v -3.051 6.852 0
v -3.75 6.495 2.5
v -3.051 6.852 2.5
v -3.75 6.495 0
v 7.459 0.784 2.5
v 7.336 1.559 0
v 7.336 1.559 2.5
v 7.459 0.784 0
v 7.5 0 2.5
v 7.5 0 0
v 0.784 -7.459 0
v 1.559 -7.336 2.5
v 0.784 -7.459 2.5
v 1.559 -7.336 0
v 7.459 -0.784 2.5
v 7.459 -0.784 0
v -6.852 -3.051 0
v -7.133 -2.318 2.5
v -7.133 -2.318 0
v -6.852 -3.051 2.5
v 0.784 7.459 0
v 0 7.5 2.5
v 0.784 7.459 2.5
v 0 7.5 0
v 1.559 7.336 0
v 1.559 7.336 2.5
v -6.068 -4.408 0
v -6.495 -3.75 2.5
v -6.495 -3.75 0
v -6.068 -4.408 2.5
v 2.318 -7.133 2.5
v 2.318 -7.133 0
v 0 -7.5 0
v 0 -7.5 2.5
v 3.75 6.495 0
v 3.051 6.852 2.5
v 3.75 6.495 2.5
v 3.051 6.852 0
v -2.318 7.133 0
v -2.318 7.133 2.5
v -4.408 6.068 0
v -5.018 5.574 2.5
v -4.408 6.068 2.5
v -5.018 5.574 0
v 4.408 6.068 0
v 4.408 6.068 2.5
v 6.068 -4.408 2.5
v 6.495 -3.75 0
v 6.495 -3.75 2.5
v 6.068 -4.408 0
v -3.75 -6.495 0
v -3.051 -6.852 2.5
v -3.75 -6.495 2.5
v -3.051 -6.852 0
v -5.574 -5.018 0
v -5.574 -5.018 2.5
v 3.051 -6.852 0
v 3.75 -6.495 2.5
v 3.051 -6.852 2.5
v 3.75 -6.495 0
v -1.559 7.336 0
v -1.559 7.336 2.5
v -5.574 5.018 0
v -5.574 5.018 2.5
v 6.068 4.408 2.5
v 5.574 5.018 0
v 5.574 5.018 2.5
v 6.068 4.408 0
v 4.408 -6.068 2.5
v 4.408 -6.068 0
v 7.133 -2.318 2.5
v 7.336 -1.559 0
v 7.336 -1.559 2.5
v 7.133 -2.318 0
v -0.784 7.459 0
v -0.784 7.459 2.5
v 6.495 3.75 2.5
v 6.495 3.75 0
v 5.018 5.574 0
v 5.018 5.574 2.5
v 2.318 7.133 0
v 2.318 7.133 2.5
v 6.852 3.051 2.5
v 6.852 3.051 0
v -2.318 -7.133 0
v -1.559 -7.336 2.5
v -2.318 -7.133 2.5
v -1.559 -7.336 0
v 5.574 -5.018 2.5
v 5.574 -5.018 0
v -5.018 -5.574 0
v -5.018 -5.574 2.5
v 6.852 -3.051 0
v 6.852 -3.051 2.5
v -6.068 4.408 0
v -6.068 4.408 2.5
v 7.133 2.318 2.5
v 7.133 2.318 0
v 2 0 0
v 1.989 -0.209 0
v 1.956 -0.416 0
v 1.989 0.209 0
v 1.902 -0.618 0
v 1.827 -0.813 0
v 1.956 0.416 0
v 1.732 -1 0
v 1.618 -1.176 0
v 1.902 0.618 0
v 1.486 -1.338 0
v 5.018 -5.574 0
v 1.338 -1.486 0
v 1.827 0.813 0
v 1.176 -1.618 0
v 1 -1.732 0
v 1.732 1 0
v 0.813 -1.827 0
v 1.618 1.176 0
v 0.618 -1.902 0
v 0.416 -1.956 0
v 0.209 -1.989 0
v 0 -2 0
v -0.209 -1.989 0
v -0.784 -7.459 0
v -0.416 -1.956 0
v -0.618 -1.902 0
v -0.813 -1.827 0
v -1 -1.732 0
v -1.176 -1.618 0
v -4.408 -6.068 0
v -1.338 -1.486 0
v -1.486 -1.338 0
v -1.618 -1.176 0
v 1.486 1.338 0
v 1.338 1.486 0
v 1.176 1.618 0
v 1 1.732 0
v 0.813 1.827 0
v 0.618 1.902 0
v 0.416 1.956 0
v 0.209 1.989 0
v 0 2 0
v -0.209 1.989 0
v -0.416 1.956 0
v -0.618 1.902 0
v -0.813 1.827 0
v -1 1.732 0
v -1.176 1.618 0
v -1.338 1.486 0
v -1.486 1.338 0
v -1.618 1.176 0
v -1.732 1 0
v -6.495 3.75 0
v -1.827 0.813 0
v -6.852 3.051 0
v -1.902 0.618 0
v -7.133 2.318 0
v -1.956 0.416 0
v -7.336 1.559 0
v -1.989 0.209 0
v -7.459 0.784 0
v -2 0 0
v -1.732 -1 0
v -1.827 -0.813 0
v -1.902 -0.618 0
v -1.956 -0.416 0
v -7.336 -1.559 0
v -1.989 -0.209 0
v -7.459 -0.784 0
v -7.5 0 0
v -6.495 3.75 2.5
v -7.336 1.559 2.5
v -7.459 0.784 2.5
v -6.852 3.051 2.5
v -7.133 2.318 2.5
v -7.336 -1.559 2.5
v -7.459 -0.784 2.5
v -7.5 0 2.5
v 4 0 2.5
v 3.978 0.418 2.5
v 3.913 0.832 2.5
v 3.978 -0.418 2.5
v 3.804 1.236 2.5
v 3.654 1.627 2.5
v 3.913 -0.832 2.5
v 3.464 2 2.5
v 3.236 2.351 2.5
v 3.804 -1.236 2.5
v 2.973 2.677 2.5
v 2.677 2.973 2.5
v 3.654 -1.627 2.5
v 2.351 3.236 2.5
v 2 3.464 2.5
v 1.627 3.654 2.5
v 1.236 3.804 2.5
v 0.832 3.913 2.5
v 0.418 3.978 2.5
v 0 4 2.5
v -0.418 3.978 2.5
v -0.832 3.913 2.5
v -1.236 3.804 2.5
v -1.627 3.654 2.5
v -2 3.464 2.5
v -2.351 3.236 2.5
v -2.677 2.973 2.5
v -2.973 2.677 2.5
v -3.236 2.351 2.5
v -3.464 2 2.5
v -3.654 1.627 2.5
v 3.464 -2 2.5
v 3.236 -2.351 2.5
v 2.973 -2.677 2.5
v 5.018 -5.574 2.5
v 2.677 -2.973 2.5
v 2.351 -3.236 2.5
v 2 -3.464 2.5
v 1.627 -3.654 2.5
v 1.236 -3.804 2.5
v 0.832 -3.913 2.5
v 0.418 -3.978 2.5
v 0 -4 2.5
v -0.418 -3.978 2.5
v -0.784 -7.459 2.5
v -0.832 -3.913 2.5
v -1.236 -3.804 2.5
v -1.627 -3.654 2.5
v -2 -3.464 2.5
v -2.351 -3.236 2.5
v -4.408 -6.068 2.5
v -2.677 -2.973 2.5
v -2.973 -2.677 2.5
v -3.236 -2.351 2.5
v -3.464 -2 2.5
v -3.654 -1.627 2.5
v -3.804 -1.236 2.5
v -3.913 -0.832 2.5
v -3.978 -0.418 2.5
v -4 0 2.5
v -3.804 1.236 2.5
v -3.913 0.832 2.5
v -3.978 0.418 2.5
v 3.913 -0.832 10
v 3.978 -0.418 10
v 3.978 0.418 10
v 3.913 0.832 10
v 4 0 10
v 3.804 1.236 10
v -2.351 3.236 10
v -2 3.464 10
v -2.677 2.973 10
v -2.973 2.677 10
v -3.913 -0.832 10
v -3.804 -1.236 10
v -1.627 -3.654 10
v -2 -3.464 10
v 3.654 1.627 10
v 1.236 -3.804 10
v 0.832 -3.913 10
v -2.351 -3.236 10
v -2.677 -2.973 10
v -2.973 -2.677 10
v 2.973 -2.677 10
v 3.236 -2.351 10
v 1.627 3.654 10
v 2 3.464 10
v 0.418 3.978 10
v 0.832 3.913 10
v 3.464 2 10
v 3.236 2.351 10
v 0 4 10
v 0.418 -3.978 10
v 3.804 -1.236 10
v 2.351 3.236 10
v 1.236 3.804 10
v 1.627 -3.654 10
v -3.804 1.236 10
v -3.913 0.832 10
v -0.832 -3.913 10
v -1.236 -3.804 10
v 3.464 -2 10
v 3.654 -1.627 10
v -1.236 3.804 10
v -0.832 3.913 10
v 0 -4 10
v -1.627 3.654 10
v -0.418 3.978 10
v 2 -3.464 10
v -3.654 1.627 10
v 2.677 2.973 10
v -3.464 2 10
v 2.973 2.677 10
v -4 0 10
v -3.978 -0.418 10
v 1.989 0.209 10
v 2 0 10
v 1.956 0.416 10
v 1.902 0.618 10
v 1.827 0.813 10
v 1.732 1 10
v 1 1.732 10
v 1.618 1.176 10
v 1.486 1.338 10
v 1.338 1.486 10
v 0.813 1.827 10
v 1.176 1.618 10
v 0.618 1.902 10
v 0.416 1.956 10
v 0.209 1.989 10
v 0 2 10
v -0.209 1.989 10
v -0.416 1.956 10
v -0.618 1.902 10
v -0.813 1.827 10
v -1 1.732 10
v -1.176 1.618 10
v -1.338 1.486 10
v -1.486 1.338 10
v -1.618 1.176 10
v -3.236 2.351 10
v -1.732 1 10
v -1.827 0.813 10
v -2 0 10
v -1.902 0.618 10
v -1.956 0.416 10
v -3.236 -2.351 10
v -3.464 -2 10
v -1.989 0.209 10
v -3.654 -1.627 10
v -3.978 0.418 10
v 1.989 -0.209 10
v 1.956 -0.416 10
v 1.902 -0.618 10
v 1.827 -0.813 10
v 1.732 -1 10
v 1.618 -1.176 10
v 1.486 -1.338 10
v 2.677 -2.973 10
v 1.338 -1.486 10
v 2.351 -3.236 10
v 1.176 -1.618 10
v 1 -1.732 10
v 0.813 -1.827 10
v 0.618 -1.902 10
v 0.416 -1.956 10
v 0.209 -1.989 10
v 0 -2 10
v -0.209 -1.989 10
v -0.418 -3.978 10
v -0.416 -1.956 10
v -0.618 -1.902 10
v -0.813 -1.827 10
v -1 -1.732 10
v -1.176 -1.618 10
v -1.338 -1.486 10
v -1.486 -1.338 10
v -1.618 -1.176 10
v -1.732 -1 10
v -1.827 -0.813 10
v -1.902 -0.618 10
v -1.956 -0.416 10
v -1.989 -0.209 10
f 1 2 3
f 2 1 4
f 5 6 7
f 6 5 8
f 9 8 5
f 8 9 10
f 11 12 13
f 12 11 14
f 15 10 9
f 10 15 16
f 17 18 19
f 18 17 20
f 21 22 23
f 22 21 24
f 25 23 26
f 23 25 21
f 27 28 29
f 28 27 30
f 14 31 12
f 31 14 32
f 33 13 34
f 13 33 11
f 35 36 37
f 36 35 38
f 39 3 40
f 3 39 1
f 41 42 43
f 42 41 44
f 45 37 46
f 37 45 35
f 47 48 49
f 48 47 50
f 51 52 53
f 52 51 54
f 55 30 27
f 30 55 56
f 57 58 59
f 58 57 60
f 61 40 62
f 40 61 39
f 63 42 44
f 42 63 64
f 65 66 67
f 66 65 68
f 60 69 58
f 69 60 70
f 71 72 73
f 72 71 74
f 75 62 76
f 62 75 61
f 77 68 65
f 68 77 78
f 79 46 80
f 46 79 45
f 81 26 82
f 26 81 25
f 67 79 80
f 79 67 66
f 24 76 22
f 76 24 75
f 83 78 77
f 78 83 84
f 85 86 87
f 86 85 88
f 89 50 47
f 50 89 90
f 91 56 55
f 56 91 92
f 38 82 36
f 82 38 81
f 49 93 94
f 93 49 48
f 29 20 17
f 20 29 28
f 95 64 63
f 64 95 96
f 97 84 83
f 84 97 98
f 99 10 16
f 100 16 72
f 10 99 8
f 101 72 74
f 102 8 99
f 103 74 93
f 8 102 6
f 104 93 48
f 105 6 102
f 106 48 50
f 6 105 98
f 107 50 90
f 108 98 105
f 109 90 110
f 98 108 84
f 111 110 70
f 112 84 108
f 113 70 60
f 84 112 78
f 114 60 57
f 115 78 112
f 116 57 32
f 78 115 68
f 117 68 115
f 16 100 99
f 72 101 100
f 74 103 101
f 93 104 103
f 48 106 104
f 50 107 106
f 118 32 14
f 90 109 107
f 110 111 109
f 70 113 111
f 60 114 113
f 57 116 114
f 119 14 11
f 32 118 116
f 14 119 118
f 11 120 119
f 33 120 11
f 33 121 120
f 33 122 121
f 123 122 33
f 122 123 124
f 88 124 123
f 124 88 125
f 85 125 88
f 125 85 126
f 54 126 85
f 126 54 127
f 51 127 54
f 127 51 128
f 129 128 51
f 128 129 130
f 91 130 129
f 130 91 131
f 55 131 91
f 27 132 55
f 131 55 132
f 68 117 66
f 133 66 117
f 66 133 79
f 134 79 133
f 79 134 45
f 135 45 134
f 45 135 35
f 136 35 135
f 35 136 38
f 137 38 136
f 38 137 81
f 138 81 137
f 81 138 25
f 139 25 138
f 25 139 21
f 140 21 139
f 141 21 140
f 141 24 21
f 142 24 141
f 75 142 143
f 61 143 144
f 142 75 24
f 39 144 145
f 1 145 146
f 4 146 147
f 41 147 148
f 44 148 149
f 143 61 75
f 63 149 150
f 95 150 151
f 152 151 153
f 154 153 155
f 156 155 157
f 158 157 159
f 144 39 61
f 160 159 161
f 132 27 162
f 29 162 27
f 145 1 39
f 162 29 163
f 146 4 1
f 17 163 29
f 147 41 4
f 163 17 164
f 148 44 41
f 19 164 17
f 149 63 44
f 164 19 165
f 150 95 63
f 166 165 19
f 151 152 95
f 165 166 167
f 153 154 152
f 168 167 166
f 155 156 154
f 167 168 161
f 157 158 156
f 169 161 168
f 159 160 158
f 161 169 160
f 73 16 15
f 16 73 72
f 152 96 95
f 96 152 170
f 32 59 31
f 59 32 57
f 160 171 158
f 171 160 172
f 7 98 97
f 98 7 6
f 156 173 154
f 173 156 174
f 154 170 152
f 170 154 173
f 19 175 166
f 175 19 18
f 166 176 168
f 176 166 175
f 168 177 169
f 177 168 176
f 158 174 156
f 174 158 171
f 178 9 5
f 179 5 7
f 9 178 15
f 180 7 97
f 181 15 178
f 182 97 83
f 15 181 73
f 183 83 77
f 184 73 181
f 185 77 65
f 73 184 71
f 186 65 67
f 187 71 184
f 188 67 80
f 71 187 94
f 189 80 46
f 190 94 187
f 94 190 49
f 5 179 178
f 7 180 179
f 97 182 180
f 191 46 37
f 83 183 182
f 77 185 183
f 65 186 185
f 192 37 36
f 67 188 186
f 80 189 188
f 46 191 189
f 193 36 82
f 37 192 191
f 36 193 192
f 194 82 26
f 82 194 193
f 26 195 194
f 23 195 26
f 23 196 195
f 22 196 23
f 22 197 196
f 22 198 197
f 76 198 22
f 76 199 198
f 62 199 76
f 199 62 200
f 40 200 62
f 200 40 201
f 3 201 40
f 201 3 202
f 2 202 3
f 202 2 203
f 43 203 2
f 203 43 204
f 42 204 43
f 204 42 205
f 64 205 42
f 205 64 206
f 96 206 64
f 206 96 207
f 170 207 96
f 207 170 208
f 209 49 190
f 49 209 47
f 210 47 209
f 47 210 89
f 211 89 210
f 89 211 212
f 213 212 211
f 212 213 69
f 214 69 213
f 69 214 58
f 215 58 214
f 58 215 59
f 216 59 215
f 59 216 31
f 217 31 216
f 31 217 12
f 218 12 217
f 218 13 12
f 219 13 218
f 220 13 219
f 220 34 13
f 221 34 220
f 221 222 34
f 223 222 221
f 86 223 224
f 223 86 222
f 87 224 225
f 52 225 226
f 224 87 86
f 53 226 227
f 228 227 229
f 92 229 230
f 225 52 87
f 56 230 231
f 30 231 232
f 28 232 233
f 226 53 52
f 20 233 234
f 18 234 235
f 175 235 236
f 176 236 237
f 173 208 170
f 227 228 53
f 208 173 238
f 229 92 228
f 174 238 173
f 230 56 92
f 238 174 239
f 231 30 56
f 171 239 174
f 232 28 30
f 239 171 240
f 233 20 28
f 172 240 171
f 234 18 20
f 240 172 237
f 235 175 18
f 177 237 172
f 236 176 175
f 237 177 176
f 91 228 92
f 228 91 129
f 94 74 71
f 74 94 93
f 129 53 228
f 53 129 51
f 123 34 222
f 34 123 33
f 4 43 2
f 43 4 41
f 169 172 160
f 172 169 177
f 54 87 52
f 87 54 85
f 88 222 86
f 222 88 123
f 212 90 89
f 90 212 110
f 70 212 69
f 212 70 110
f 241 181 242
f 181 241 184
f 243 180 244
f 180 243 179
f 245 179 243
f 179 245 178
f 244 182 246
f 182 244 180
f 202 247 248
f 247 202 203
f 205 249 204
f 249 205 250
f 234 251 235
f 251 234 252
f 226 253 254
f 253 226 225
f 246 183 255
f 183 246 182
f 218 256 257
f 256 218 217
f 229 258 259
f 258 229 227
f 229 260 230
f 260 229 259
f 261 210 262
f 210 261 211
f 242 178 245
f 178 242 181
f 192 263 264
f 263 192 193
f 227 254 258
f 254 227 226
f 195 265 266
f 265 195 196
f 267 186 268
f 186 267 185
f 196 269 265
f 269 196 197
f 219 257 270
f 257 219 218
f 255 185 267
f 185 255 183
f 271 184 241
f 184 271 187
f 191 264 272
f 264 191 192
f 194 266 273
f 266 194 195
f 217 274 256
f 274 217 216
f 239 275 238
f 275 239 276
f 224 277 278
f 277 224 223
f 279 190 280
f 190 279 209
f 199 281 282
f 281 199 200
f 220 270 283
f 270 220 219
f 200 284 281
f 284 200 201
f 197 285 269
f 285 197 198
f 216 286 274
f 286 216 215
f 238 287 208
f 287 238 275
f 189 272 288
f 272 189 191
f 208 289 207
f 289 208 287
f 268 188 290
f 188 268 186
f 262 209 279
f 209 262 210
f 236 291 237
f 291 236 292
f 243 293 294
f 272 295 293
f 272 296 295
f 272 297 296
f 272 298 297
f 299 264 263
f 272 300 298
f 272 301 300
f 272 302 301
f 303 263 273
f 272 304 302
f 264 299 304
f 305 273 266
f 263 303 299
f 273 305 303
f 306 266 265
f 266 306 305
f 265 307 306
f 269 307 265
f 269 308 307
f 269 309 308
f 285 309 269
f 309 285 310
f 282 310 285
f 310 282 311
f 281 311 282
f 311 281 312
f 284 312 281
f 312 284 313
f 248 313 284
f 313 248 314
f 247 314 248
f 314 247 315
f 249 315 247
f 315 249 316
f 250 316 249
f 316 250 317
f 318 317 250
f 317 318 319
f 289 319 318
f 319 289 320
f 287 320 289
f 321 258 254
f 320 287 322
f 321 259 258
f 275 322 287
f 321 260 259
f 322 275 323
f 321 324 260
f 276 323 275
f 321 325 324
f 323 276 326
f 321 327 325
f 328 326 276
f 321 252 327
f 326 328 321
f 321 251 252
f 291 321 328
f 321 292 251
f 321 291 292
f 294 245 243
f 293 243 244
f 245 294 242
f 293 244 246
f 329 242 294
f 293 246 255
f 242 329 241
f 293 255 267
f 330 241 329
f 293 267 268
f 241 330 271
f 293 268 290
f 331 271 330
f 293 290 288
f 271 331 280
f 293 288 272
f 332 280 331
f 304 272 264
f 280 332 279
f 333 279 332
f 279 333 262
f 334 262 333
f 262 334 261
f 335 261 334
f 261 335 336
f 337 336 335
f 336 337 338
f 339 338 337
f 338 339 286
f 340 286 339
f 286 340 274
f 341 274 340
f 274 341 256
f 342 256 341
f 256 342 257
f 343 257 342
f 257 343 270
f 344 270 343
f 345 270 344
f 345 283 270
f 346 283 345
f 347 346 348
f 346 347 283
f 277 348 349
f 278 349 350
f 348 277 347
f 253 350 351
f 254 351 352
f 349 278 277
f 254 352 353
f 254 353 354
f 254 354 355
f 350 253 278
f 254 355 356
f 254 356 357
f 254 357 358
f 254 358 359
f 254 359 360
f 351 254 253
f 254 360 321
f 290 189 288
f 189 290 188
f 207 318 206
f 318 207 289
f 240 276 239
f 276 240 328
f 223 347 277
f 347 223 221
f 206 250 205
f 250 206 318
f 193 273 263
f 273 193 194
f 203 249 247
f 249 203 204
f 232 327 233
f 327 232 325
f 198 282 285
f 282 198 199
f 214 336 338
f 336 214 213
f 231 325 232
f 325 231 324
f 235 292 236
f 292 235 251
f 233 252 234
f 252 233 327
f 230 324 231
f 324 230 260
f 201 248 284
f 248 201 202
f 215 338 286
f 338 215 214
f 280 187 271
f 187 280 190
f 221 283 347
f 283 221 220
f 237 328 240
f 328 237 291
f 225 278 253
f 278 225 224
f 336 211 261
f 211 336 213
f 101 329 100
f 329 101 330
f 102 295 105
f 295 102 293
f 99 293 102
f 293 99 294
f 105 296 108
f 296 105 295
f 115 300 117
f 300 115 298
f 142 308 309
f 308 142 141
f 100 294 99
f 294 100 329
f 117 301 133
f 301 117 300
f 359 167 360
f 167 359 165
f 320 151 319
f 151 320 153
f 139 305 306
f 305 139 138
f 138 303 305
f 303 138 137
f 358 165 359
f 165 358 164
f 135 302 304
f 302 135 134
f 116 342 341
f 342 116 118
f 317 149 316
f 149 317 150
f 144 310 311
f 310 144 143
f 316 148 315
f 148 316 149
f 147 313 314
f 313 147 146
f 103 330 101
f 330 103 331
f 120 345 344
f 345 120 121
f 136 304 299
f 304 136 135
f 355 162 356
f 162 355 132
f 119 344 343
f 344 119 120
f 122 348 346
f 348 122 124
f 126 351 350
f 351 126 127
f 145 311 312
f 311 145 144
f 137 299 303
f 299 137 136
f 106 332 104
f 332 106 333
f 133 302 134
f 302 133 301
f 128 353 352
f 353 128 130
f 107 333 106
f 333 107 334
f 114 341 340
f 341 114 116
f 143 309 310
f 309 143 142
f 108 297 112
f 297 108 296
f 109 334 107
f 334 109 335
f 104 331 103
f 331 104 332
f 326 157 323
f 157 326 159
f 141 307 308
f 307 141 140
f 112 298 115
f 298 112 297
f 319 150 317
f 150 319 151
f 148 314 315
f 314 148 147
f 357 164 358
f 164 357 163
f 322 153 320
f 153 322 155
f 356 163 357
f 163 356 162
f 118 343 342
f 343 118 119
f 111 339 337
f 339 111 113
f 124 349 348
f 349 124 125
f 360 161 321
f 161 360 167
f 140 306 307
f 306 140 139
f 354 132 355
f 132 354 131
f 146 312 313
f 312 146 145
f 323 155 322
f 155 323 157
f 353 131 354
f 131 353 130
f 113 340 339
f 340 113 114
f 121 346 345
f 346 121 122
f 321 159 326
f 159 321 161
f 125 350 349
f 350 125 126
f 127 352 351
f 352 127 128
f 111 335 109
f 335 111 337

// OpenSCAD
// Flanged sleeve bushing.
$fn = 60;
eps = 0.02;
inner_d = 4;
outer_d = 8;
length = 10;
flange_d = 15;
flange_t = 2.5;
difference() {
    union() {
        cylinder(d = flange_d, h = flange_t);
        cylinder(d = outer_d, h = length);
    }
    translate([0, 0, -eps]) cylinder(d = inner_d, h = length + 2 * eps);
}
